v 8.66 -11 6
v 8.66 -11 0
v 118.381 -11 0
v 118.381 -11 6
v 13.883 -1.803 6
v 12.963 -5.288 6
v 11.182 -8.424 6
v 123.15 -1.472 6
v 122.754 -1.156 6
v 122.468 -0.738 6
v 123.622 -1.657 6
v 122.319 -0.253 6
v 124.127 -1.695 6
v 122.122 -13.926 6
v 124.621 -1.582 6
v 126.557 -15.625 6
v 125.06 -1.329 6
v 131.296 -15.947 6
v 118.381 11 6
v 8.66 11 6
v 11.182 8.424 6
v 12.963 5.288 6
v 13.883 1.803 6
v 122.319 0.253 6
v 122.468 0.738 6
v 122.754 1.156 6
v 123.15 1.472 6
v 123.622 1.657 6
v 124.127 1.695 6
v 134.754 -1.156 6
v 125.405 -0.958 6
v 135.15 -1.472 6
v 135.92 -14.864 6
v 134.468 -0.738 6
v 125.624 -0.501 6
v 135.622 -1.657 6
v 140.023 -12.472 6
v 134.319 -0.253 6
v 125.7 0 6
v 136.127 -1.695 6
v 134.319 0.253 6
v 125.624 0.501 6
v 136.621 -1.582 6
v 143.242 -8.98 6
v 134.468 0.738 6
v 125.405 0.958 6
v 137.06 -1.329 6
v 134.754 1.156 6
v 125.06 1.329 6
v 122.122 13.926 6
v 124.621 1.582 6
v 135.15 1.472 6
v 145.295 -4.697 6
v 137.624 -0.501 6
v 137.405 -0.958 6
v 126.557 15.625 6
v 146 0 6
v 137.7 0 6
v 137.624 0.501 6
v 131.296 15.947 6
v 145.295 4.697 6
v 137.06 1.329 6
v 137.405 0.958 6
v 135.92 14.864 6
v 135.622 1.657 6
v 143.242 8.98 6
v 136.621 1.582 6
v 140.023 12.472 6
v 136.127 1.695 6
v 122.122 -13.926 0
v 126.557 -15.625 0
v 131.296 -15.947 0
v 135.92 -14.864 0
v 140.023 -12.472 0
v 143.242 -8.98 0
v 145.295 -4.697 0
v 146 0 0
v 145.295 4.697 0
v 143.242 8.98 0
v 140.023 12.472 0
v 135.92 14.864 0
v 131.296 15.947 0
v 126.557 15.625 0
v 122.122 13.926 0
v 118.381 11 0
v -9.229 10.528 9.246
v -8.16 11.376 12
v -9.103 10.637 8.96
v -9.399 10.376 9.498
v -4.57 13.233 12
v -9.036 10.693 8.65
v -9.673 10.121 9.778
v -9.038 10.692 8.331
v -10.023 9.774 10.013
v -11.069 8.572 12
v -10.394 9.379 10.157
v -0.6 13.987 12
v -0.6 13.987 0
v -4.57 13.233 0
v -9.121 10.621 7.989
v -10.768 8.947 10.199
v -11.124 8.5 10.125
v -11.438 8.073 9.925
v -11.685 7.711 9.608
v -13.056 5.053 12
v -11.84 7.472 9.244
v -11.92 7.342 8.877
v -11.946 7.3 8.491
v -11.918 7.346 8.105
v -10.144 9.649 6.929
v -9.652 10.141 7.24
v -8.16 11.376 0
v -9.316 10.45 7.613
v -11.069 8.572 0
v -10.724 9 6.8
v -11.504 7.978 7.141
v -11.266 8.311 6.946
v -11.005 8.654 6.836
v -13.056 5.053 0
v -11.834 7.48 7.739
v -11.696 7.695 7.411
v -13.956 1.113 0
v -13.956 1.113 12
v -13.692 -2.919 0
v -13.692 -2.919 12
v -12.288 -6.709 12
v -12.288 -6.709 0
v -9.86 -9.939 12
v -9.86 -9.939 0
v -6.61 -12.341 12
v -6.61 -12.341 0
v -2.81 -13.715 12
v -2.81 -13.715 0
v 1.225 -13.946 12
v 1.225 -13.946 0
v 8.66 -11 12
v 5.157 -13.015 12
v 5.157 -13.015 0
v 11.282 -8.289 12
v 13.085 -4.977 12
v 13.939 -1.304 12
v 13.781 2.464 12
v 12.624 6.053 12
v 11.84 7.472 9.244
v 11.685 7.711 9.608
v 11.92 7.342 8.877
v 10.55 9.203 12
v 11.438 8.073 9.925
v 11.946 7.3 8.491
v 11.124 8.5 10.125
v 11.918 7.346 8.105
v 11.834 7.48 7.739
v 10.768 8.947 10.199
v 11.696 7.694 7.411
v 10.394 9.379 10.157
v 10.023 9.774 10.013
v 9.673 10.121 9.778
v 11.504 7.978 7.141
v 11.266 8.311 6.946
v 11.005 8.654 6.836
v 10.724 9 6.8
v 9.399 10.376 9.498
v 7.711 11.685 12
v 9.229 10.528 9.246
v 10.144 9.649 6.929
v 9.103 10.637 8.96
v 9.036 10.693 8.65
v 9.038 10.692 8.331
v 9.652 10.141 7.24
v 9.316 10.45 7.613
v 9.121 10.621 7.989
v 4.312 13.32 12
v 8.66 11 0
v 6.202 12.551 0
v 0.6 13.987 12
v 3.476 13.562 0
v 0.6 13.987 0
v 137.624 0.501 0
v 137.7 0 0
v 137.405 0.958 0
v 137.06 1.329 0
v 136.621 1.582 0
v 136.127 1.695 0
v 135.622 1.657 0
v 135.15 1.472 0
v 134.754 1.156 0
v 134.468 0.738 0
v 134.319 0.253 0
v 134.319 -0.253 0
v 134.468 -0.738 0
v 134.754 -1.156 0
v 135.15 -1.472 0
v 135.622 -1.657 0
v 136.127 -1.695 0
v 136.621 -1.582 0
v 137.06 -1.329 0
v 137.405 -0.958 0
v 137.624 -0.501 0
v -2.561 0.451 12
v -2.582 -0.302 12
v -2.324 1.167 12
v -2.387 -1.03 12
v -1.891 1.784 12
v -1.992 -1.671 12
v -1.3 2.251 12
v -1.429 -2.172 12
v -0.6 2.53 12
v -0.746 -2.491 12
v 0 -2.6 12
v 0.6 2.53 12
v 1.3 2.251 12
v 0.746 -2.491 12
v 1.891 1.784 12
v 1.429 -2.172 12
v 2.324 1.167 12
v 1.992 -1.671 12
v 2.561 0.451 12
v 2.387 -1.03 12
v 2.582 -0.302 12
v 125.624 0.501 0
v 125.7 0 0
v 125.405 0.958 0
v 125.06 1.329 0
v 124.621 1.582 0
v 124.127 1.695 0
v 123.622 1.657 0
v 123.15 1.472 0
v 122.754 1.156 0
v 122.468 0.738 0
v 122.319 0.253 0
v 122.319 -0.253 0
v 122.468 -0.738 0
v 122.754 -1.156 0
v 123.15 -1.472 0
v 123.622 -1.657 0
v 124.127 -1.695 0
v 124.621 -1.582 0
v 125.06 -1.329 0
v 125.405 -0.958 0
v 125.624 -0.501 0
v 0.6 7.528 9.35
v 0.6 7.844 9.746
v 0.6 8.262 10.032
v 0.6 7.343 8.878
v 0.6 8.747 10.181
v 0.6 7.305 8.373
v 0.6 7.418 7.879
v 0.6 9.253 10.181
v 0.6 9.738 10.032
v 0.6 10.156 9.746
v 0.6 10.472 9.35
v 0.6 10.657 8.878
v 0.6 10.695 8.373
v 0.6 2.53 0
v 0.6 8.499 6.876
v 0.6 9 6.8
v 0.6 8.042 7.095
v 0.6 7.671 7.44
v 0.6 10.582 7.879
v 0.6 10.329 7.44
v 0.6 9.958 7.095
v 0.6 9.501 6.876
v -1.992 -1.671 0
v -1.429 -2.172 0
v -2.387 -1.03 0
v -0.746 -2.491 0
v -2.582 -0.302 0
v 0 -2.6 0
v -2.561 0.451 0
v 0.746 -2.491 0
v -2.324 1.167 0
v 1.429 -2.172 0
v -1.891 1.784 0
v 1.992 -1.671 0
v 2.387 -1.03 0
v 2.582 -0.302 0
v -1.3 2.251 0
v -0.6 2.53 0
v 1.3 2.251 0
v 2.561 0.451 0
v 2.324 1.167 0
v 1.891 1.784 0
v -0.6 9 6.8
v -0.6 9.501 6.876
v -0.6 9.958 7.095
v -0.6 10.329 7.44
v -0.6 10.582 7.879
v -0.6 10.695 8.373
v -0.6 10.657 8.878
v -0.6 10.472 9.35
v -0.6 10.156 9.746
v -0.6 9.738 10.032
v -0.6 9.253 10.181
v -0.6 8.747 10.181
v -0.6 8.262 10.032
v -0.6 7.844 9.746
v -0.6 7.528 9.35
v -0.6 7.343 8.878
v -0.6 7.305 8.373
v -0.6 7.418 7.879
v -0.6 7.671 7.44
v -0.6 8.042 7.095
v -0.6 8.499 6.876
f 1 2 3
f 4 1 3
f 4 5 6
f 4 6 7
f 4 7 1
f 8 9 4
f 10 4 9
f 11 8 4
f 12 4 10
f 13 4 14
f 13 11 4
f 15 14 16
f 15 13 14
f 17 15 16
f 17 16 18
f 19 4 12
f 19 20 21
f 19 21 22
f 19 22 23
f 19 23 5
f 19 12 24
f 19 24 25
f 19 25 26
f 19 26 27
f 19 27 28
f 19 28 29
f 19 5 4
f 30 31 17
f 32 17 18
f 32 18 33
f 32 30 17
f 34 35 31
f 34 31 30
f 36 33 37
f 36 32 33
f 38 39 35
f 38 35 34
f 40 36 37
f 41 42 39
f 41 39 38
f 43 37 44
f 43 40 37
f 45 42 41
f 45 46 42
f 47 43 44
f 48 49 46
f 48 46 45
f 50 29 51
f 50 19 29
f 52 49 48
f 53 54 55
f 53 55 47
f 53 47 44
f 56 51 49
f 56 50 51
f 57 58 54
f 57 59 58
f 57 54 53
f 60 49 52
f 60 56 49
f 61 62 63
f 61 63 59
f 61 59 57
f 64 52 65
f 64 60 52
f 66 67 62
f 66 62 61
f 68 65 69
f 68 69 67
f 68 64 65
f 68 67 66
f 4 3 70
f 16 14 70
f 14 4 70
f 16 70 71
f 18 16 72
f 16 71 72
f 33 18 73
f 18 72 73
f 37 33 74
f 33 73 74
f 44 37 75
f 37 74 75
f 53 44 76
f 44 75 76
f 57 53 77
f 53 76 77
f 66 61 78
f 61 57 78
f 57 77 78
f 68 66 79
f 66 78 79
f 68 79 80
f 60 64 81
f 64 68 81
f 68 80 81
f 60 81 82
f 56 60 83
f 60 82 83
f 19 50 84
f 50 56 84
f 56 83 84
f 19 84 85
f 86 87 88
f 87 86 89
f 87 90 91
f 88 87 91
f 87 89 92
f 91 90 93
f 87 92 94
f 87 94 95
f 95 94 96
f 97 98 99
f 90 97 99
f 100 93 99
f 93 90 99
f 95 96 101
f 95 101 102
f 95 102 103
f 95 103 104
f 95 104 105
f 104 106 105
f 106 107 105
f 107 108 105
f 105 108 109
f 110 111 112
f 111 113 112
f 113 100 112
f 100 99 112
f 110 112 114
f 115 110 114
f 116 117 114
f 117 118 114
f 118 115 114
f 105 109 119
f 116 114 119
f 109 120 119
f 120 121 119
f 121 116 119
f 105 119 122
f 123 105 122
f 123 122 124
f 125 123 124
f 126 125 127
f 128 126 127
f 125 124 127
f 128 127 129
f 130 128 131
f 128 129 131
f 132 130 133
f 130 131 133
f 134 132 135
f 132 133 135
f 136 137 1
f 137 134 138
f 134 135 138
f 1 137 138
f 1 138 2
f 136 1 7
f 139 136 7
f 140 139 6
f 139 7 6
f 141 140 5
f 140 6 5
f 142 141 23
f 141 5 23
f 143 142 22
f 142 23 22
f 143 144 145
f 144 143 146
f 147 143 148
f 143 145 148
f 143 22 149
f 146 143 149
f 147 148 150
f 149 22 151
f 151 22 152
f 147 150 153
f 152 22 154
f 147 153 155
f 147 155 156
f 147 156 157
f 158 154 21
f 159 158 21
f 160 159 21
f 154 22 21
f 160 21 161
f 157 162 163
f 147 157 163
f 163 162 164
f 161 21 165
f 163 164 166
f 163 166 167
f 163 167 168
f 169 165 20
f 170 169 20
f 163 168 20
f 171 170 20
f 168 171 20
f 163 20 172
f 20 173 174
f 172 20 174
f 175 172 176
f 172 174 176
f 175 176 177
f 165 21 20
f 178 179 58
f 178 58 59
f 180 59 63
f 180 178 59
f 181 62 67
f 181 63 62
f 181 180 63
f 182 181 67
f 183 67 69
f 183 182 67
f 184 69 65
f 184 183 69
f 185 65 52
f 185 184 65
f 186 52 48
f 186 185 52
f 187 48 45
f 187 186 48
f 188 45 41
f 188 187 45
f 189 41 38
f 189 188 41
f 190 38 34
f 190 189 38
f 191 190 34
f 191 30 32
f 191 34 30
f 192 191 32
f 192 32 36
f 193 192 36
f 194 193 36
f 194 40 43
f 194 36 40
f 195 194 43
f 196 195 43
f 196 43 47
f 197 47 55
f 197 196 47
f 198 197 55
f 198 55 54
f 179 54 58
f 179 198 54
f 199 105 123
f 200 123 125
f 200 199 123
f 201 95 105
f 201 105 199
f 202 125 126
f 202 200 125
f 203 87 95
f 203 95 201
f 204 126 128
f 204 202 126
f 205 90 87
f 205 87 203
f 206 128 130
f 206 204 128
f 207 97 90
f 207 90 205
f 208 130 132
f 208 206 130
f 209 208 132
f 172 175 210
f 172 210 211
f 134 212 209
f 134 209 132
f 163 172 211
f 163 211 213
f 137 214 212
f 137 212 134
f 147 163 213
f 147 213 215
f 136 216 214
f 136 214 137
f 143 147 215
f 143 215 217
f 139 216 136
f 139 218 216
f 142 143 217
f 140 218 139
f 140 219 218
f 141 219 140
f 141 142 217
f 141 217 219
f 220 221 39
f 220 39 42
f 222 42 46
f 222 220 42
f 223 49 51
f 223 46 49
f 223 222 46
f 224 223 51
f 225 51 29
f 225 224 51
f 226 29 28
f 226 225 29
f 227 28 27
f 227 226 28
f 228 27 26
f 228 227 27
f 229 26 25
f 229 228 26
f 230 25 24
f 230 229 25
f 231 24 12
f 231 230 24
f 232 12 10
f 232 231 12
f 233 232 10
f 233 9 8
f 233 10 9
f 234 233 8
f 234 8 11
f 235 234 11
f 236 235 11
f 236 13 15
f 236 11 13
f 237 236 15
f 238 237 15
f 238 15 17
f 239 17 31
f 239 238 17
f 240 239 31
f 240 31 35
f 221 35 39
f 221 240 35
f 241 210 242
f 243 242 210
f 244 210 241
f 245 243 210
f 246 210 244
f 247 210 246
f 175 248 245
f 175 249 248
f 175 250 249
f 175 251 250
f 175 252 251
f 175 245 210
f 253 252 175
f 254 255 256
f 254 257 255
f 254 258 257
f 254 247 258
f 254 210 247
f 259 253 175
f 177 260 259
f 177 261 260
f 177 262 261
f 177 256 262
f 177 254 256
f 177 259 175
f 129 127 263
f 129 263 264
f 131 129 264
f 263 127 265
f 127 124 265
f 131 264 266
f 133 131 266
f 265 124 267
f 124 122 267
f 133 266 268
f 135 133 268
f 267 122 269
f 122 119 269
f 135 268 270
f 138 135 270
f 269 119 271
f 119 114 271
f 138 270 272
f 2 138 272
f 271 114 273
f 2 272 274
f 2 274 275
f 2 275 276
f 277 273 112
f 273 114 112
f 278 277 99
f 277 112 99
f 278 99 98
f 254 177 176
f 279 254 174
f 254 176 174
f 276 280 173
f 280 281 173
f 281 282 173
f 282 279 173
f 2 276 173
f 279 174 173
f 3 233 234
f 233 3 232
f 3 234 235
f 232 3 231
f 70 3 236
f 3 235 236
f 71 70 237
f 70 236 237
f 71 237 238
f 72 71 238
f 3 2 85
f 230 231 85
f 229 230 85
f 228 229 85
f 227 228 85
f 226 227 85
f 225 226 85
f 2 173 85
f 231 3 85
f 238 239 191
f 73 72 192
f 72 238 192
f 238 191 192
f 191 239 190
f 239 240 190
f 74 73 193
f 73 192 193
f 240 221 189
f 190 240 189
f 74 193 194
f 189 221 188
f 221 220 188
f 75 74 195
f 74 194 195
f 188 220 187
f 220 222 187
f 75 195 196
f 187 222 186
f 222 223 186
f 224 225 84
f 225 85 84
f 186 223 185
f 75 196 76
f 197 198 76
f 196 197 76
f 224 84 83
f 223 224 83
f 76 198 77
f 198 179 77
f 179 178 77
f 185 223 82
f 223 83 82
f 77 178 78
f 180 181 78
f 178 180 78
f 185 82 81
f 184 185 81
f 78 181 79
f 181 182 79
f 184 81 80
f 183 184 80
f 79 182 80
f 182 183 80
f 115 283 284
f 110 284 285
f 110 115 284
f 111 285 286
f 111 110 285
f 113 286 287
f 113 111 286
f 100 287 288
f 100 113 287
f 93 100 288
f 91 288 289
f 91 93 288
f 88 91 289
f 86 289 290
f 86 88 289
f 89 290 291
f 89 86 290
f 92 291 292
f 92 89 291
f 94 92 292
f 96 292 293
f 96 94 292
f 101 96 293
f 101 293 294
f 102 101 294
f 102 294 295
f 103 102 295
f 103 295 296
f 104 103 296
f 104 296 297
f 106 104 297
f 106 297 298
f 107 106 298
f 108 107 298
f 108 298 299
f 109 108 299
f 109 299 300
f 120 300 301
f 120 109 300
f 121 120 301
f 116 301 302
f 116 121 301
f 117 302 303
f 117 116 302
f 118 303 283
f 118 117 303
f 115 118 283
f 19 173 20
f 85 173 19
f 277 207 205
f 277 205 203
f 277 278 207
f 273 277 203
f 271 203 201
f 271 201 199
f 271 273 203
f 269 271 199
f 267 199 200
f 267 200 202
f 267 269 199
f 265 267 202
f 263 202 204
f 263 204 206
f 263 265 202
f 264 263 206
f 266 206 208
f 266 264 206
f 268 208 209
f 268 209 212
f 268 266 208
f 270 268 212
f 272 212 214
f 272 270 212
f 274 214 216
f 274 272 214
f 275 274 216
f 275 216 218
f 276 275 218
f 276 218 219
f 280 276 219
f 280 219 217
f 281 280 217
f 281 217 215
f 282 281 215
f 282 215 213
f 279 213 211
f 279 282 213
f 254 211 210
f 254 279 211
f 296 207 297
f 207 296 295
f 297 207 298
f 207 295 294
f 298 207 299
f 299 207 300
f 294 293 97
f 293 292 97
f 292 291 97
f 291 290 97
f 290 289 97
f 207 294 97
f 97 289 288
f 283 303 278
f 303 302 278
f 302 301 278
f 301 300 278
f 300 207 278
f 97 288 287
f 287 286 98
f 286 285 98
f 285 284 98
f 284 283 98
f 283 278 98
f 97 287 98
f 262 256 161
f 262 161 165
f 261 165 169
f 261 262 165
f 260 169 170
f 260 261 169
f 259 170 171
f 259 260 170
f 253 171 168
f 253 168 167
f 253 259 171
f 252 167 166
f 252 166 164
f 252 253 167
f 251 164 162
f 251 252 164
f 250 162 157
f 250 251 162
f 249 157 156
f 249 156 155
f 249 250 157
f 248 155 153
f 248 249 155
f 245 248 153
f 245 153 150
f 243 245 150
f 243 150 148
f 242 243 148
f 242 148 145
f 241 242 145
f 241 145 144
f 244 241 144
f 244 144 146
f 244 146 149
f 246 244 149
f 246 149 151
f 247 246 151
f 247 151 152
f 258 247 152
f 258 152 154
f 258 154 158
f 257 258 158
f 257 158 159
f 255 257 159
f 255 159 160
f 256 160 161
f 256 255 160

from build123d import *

# Parameters (mm, degrees)
SKETCH_1_W                         = 130
SKETCH_1_H                         = 22
ARM_WEB_L130_W22_T6_DEPTH          = 6
SKETCH_2_R                         = 14
SPLIT_CLAMP_HUB_DEPTH              = 12
SKETCH_3_R                         = 16
WRIST_END_R16_DEPTH                = 6
SHAFT_D5P2_AND_WRIST_M3_DEPTH      = 148.363496158
SHAFT_D5P2_AND_WRIST_M3_DEPTH_BACK = 148.363496158
SKETCH_4_R                         = 2.6
SKETCH_4_R_2                       = 1.7
CLAMP_SPLIT_1P2_DEPTH              = 148.363496158
CLAMP_SPLIT_1P2_DEPTH_BACK         = 148.363496158
SKETCH_5_W                         = 1.2
SKETCH_5_H                         = 12.8
CLAMP_CROSSBOLT_M3_DEPTH           = 148.363496158
CLAMP_CROSSBOLT_M3_DEPTH_BACK      = 148.363496158
SKETCH_6_R                         = 1.7


with BuildPart() as part:
    # 草图1 → Arm_web_L130_W22_T6 (new body)
    with BuildSketch(Plane.XY):
        with Locations((65, 0)):
            Rectangle(SKETCH_1_W, SKETCH_1_H)
    extrude(amount=ARM_WEB_L130_W22_T6_DEPTH)

    # 草图2 → Split_clamp_hub (add)
    with BuildSketch(Plane.XY):
        with Locations(Location((0, 0, 0), (0, 0, 308.213210702))):
            Circle(SKETCH_2_R)
    extrude(amount=SPLIT_CLAMP_HUB_DEPTH)

    # 草图3 → Wrist_end_R16 (add)
    with BuildSketch(Plane.XY):
        with Locations((130, 0)):
            Circle(SKETCH_3_R)
    extrude(amount=WRIST_END_R16_DEPTH)

    # 草图4 → Shaft_D5p2_and_wrist_M3 (cut, two sides: drawn at the far end of the back side and taken through both)
    with BuildSketch(Plane.XY.offset(-SHAFT_D5P2_AND_WRIST_M3_DEPTH_BACK)):
        Circle(SKETCH_4_R)
        with Locations((124, 0)):
            Circle(SKETCH_4_R_2)
        with Locations((136, 0)):
            Circle(SKETCH_4_R_2)
    extrude(amount=SHAFT_D5P2_AND_WRIST_M3_DEPTH + SHAFT_D5P2_AND_WRIST_M3_DEPTH_BACK, mode=Mode.SUBTRACT)

    # 草图5 → Clamp_split_1p2 (cut, two sides: drawn at the far end of the back side and taken through both)
    with BuildSketch(Plane.XY.offset(-CLAMP_SPLIT_1P2_DEPTH_BACK)):
        with Locations((0, 8.6)):
            Rectangle(SKETCH_5_W, SKETCH_5_H)
    extrude(amount=CLAMP_SPLIT_1P2_DEPTH + CLAMP_SPLIT_1P2_DEPTH_BACK, mode=Mode.SUBTRACT)

    # 草图6 → Clamp_crossbolt_M3 (cut, two sides: drawn at the far end of the back side and taken through both)
    with BuildSketch(Plane(origin=(0, 0, 0), x_dir=(0, 0, -1), z_dir=(1, 0, 0)).offset(-CLAMP_CROSSBOLT_M3_DEPTH_BACK)):
        with Locations((-8.5, 9)):
            Circle(SKETCH_6_R)
    extrude(amount=CLAMP_CROSSBOLT_M3_DEPTH + CLAMP_CROSSBOLT_M3_DEPTH_BACK, mode=Mode.SUBTRACT)


solid = part.part
